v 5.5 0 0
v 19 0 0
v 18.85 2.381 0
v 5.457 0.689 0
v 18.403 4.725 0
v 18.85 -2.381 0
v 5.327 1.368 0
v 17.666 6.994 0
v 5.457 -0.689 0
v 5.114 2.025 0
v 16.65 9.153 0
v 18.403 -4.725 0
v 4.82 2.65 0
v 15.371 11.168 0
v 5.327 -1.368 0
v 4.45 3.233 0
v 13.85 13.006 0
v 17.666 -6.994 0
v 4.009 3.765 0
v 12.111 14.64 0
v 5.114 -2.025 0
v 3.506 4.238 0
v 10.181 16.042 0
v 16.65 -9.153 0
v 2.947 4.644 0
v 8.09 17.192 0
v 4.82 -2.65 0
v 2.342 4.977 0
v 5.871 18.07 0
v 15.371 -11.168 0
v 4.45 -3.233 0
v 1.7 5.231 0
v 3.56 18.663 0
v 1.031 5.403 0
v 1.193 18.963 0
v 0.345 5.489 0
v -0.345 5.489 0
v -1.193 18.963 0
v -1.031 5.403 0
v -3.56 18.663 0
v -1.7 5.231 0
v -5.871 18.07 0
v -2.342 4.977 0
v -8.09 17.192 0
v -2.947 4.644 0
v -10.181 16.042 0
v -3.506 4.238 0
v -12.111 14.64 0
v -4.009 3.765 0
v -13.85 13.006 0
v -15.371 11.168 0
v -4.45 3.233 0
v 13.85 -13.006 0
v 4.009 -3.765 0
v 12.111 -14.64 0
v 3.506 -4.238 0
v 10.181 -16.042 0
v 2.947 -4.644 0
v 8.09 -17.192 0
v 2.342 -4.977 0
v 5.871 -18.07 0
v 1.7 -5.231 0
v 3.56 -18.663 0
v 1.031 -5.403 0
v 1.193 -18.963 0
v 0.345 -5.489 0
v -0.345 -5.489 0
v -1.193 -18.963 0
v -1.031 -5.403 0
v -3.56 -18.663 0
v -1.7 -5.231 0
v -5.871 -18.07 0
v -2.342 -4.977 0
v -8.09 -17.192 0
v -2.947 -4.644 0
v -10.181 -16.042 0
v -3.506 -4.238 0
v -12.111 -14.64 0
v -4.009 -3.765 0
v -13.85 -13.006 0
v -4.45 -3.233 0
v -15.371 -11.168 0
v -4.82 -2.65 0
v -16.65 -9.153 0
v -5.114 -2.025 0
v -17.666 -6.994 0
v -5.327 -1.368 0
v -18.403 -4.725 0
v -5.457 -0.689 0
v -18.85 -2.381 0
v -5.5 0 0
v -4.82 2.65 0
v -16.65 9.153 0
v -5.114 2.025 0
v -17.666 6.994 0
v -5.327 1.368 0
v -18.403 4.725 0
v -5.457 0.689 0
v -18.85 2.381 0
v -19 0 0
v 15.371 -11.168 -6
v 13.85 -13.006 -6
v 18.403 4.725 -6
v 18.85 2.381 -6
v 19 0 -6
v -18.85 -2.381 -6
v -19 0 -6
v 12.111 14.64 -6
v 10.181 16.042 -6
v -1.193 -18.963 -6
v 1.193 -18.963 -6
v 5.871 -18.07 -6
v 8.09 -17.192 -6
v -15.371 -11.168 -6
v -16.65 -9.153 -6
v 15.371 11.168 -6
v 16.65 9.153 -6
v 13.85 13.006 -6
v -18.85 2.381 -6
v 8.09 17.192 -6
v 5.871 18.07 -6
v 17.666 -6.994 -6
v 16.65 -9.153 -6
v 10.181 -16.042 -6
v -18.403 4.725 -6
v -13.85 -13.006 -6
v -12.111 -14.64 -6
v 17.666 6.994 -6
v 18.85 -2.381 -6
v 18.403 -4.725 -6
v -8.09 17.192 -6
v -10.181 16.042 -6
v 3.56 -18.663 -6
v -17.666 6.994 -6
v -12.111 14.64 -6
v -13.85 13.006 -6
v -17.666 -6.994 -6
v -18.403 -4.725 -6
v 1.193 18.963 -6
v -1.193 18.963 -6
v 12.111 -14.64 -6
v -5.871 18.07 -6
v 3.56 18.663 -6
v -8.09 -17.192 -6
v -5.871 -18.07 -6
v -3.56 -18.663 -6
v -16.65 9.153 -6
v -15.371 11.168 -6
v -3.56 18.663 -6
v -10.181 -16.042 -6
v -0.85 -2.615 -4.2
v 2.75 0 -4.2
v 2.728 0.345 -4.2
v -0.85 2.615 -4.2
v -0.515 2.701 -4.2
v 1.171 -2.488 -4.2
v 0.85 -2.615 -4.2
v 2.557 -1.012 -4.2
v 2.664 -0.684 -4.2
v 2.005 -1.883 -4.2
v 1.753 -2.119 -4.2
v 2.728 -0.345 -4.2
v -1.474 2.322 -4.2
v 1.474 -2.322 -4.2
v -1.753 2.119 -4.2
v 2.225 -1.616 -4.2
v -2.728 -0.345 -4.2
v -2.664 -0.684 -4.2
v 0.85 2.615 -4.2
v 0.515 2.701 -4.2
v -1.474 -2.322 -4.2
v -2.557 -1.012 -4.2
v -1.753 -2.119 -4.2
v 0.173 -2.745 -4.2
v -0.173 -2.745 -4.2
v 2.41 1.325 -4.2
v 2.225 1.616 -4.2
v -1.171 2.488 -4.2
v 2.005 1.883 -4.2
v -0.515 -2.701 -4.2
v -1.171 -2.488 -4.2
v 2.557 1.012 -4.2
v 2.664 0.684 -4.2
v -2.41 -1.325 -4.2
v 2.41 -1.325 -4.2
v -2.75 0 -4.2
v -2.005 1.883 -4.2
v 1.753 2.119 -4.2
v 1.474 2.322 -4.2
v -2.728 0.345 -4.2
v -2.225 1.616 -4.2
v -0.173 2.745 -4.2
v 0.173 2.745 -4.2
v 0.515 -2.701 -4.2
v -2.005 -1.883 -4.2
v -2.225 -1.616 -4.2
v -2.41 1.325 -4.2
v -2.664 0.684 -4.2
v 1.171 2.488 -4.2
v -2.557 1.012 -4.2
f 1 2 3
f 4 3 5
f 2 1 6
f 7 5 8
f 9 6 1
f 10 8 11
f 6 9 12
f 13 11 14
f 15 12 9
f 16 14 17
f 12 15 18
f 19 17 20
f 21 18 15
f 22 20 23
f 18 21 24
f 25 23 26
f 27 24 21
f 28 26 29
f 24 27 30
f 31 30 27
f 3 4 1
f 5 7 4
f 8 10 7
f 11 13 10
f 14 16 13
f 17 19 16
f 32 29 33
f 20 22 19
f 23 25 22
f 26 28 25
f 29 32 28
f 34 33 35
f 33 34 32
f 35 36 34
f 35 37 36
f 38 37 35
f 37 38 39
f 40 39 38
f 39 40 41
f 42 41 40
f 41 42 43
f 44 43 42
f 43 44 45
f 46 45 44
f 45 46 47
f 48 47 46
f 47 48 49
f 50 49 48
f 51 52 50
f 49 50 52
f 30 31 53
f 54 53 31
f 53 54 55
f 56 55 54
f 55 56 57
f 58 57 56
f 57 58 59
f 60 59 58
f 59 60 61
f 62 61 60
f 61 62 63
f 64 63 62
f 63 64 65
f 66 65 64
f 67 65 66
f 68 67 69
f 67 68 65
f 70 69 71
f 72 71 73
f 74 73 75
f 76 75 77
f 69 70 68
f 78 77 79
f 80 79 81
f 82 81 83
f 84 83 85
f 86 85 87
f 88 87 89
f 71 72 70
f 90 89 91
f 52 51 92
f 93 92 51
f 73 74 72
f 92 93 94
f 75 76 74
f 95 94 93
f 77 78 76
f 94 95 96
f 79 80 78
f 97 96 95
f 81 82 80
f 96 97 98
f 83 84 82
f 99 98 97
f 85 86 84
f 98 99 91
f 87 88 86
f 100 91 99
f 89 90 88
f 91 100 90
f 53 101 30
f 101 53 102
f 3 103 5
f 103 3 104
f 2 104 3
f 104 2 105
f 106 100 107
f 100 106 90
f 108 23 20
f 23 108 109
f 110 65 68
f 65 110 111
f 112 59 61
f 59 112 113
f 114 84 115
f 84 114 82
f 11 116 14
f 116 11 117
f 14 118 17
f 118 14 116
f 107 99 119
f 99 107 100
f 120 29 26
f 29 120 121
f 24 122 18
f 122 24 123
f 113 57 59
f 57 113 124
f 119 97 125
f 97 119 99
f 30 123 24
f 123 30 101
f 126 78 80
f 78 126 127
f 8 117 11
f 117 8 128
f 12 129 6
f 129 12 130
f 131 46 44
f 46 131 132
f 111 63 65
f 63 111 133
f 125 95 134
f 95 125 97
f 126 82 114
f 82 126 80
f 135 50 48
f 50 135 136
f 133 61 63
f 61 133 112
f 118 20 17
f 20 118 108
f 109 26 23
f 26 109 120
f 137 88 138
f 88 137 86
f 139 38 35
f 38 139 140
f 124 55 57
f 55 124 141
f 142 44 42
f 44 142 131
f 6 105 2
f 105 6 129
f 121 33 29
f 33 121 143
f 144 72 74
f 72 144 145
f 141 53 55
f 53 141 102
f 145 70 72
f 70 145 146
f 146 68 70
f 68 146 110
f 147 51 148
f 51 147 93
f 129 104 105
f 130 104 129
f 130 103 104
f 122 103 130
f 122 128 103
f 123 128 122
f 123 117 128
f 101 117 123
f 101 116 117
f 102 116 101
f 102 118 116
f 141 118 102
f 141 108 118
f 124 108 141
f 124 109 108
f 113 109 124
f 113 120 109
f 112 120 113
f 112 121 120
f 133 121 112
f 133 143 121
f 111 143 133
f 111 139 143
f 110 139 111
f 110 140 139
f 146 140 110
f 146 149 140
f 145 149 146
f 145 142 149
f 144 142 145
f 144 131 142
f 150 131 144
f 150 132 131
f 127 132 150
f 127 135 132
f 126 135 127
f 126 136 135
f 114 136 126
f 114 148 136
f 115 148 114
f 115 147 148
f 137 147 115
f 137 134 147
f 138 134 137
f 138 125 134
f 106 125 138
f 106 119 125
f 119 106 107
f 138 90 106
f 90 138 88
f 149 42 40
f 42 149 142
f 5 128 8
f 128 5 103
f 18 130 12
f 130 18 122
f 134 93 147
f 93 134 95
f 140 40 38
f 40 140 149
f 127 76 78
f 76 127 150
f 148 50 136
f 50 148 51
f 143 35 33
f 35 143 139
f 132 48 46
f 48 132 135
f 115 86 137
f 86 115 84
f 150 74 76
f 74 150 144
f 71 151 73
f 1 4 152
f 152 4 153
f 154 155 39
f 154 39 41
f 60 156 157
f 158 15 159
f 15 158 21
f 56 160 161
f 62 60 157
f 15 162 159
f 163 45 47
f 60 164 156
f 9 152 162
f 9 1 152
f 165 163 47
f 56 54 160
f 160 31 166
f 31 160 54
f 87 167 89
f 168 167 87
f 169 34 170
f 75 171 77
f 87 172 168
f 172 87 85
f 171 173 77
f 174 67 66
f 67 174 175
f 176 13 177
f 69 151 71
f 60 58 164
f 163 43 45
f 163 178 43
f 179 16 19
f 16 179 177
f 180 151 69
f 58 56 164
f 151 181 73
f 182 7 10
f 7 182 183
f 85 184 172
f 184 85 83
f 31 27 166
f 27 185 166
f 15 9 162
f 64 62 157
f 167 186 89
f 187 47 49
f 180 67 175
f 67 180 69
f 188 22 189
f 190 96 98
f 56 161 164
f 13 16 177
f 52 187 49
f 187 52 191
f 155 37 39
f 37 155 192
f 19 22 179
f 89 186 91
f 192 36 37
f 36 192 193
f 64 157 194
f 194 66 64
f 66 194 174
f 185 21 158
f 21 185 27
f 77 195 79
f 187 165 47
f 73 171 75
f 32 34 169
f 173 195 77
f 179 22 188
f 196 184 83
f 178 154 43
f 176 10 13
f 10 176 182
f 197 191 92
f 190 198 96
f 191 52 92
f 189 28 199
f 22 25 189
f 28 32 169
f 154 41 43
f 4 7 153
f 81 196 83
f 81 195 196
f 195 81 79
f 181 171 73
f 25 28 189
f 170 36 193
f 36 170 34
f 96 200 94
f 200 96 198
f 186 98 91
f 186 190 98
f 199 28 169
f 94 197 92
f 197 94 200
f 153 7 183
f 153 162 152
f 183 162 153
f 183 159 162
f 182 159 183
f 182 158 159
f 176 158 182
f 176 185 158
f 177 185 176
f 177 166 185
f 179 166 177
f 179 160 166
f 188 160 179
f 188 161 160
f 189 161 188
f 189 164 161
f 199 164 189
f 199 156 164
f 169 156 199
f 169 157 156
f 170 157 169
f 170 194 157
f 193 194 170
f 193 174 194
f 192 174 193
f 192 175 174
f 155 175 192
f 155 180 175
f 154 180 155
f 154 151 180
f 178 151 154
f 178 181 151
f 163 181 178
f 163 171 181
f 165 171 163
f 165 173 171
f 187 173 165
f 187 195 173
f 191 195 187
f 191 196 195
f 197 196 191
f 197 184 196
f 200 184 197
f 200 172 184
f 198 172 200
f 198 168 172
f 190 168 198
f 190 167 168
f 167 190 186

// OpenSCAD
$fn = 50;


difference() {
	union() {
		translate(v = [0, 0, -3.0000000000]) {
			cylinder(h = 3, r = 10.0000000000);
		}
		translate(v = [0, 0, -6.0000000000]) {
			cylinder(h = 6, r = 19.0000000000);
		}
	}
	union() {
		translate(v = [0, 0, 0]) {
			rotate(a = [0, 0, 0]) {
				difference() {
					union() {
						#translate(v = [0, 0, -3.0000000000]) {
							cylinder(h = 3, r = 2.2500000000);
						}
						#translate(v = [0, 0, -4.2000000000]) {
							cylinder(h = 4.2000000000, r1 = 2.7500000000, r2 = 5.5000000000);
						}
						#translate(v = [0, 0, -3.0000000000]) {
							cylinder(h = 3, r = 2.7500000000);
						}
						#translate(v = [0, 0, -3.0000000000]) {
							cylinder(h = 3, r = 2.2500000000);
						}
					}
					union();
				}
			}
		}
	}
}
